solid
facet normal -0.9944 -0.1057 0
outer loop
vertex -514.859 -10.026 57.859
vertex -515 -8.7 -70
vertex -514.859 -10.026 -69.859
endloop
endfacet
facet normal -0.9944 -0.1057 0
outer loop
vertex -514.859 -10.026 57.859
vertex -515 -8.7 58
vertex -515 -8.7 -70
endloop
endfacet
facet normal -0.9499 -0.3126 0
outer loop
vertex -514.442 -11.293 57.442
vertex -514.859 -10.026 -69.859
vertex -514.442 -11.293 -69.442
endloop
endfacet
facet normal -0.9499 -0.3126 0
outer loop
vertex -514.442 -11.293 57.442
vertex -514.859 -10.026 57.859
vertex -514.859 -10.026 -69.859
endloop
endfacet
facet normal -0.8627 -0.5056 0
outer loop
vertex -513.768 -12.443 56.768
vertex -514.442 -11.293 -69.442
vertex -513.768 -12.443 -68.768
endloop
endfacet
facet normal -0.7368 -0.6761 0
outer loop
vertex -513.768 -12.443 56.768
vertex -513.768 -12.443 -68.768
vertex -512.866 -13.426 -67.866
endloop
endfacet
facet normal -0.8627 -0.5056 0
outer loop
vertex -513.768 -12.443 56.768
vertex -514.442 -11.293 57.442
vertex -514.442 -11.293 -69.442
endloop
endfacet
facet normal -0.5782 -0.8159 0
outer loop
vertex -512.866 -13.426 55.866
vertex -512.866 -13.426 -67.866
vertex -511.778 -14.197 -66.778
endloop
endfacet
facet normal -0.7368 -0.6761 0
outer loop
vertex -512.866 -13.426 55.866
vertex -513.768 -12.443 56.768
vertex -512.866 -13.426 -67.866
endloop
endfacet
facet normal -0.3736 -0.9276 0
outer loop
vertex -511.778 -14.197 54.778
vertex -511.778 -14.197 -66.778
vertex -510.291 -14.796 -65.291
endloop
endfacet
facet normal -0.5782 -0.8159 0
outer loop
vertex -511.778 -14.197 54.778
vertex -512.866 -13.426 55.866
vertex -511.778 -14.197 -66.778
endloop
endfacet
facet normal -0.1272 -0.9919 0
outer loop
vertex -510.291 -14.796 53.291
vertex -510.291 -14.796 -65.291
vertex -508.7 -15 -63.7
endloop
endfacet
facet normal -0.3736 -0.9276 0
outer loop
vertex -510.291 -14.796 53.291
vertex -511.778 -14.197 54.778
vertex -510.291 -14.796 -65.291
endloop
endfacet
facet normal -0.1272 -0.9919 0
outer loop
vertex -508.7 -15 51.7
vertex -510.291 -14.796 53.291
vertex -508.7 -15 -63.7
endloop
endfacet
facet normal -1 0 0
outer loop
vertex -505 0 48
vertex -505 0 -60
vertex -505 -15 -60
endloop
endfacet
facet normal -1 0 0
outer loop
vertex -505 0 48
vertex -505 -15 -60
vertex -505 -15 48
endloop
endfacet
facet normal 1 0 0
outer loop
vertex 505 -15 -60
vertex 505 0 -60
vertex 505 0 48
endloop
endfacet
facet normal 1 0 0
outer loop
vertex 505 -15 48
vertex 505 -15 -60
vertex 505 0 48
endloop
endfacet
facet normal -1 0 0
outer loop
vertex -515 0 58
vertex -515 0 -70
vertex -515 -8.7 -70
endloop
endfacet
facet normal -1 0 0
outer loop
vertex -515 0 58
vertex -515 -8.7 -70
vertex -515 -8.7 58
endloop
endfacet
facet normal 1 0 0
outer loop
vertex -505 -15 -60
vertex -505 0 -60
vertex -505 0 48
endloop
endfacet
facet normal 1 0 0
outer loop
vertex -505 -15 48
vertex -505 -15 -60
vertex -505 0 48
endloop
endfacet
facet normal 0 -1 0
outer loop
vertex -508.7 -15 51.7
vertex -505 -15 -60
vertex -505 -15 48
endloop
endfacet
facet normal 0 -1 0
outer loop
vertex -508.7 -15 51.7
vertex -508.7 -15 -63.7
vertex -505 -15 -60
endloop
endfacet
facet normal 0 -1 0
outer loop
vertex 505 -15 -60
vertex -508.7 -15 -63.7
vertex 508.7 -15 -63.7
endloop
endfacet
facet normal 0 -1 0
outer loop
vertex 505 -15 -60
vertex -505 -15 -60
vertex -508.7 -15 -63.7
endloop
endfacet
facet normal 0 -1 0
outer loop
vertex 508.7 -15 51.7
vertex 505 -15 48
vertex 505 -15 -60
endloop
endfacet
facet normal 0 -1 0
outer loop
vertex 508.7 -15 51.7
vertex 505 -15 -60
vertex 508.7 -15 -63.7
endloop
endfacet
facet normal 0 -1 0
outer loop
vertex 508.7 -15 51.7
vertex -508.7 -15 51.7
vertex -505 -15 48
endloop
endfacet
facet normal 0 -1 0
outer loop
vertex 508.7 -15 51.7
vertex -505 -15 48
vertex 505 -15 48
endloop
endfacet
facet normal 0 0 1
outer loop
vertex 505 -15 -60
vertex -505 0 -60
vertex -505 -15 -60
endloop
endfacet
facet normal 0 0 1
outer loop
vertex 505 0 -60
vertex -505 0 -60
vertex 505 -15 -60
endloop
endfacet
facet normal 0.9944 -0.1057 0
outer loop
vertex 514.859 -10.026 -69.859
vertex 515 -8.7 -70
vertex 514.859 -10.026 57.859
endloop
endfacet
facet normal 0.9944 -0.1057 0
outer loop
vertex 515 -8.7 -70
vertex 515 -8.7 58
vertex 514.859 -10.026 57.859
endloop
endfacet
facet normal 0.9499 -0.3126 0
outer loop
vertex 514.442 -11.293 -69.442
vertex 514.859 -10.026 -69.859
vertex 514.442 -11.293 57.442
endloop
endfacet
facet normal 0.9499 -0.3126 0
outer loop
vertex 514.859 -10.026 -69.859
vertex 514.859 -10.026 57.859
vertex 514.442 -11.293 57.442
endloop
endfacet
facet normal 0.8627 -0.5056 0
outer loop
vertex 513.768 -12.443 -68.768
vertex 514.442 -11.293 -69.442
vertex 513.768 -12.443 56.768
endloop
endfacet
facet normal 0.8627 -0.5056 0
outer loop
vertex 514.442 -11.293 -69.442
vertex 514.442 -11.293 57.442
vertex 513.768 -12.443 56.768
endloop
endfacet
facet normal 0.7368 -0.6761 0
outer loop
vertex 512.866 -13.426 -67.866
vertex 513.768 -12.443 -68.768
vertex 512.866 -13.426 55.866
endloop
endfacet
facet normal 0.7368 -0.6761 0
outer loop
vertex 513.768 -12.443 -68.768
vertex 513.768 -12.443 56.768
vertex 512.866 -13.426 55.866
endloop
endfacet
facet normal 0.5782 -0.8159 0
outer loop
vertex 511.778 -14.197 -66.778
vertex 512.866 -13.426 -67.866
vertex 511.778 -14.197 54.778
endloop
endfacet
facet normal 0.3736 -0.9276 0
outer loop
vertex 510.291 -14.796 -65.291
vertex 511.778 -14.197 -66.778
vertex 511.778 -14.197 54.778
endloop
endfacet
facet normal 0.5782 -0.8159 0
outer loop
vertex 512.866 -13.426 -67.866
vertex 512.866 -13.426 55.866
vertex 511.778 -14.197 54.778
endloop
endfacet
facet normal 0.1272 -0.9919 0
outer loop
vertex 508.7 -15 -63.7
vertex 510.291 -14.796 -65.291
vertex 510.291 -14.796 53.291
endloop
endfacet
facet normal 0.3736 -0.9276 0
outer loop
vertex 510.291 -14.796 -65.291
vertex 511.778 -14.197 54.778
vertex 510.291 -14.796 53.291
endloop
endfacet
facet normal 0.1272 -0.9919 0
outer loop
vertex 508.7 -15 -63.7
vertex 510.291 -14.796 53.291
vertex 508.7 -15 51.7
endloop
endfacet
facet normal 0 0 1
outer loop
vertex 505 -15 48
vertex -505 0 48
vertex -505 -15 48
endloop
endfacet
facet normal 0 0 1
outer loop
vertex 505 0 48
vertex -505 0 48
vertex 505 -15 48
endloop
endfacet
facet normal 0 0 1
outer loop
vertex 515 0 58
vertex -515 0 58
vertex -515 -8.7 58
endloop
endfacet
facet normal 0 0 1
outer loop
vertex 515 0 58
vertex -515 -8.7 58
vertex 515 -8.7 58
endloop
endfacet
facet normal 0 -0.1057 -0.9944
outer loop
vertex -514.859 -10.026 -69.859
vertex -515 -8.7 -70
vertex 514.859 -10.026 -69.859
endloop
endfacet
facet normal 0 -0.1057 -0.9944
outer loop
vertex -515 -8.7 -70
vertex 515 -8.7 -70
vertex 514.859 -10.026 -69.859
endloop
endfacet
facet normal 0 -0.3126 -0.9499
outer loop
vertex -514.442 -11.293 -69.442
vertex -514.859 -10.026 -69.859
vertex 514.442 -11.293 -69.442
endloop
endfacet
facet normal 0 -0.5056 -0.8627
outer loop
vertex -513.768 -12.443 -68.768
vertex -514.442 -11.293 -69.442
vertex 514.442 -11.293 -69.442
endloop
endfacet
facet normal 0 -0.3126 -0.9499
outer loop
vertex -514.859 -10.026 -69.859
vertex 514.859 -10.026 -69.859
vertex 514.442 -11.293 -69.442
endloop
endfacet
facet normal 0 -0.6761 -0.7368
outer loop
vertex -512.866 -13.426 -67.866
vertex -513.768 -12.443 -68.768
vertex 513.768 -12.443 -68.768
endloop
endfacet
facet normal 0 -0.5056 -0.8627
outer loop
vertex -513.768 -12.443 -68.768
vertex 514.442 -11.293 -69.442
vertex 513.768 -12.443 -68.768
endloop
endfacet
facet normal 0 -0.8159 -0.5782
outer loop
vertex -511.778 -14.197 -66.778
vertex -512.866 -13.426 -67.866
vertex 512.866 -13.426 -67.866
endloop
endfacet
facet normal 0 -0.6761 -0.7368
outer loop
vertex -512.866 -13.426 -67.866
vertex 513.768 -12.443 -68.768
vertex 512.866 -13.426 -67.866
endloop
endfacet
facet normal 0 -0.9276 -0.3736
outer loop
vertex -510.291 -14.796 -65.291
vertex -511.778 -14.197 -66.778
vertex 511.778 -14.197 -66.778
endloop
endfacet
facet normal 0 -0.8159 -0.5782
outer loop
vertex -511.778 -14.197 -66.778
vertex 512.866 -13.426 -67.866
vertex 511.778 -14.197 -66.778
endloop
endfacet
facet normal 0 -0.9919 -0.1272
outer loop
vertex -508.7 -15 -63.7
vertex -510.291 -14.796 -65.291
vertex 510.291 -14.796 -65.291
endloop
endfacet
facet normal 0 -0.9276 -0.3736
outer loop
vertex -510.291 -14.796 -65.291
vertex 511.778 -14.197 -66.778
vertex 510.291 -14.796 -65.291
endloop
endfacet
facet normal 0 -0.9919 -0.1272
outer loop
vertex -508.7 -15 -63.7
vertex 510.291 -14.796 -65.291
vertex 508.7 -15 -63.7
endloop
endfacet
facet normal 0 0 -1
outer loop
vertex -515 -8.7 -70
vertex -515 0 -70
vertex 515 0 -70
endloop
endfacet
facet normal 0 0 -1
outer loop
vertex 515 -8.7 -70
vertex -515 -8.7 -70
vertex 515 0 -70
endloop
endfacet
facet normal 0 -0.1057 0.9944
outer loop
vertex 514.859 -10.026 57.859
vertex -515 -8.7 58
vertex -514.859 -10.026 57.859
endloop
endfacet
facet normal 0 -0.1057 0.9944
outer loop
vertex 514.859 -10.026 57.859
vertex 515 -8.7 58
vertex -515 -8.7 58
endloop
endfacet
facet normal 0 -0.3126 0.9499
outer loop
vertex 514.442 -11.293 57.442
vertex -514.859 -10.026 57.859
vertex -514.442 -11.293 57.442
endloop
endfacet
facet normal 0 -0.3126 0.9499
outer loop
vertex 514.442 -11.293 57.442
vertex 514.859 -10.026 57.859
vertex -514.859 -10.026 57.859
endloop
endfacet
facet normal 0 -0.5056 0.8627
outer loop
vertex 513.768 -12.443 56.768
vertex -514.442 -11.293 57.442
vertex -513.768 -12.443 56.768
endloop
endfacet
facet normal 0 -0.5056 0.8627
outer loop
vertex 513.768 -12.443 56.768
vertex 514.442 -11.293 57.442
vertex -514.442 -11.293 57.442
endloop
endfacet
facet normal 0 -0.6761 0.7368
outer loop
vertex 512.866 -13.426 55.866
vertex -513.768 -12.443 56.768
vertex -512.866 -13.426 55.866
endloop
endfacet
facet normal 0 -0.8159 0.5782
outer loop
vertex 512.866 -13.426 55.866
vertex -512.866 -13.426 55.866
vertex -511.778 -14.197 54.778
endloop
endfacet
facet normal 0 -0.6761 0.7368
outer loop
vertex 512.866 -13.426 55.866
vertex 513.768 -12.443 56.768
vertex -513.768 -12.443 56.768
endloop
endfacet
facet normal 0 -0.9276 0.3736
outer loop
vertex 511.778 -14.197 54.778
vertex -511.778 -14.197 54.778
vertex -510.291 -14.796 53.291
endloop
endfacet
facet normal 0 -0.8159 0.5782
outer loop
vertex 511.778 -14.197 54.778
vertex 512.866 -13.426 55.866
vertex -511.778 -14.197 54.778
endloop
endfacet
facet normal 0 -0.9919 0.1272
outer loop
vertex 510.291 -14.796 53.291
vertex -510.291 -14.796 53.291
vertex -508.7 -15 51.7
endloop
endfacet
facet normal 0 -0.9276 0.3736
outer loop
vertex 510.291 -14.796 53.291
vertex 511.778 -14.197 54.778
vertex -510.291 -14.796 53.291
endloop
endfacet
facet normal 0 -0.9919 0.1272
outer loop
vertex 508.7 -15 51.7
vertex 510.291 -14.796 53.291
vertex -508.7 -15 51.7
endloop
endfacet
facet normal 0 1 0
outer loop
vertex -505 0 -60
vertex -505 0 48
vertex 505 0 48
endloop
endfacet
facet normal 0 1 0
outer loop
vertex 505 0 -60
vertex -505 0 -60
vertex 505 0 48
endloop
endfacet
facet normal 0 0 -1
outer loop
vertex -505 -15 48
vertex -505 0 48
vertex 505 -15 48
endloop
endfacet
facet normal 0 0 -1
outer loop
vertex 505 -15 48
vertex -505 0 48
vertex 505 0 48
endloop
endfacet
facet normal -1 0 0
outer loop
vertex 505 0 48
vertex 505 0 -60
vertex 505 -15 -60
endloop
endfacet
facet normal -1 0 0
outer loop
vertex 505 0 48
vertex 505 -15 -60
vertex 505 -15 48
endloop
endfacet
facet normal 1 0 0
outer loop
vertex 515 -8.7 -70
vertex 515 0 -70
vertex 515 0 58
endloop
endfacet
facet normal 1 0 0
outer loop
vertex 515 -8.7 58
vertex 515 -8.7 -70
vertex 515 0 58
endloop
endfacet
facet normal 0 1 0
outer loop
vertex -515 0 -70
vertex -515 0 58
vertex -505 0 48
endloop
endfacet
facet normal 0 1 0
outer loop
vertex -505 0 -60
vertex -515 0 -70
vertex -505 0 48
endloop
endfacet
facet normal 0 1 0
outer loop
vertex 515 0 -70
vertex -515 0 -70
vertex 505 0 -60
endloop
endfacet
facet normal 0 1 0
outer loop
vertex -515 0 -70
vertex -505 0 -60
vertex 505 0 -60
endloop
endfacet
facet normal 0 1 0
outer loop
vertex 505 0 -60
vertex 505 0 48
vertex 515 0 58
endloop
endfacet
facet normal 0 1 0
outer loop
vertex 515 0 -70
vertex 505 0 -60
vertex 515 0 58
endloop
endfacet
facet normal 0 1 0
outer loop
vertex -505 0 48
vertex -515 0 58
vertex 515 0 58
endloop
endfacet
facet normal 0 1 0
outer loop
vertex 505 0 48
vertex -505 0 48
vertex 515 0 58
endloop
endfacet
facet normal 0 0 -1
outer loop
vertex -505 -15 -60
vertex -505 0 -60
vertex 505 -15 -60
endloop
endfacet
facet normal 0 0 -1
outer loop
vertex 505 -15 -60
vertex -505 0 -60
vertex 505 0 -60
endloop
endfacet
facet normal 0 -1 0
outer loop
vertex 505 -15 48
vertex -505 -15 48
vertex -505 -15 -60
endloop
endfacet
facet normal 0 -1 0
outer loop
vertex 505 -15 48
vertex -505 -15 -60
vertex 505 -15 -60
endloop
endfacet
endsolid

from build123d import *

# Parameters (mm, degrees)
F0_W     = 1010
F0_H     = 108
F1_DEPTH = 15
F0_W_2   = 1030
F0_H_2   = 128
F2_DEPTH = 15
F3_R     = 6.3


with BuildPart() as f1:
    # F0 (on Front) → F1 (new body)
    with BuildSketch(Plane.XZ):
        with Locations((0, -6)):
            Rectangle(F0_W, F0_H)
    extrude(amount=F1_DEPTH)


with BuildPart() as f2:
    # F0 (on Front) → F2 (new body)
    with BuildSketch(Plane.XZ):
        with Locations((0, -6)):
            Rectangle(F0_W_2, F0_H_2)
        with Locations((0, -6)):
            Rectangle(F0_W, F0_H, mode=Mode.SUBTRACT)
    extrude(amount=F2_DEPTH)

    # F3
    f3_edges = [f2.edges().sort_by_distance(p)[0] for p in [
        (0, -15, 58),
        (-515, -15, -6),
        (0, -15, -70),
        (515, -15, -6),
    ]]
    fillet(f3_edges, radius=F3_R)


solid = Compound([f1.part, f2.part])
